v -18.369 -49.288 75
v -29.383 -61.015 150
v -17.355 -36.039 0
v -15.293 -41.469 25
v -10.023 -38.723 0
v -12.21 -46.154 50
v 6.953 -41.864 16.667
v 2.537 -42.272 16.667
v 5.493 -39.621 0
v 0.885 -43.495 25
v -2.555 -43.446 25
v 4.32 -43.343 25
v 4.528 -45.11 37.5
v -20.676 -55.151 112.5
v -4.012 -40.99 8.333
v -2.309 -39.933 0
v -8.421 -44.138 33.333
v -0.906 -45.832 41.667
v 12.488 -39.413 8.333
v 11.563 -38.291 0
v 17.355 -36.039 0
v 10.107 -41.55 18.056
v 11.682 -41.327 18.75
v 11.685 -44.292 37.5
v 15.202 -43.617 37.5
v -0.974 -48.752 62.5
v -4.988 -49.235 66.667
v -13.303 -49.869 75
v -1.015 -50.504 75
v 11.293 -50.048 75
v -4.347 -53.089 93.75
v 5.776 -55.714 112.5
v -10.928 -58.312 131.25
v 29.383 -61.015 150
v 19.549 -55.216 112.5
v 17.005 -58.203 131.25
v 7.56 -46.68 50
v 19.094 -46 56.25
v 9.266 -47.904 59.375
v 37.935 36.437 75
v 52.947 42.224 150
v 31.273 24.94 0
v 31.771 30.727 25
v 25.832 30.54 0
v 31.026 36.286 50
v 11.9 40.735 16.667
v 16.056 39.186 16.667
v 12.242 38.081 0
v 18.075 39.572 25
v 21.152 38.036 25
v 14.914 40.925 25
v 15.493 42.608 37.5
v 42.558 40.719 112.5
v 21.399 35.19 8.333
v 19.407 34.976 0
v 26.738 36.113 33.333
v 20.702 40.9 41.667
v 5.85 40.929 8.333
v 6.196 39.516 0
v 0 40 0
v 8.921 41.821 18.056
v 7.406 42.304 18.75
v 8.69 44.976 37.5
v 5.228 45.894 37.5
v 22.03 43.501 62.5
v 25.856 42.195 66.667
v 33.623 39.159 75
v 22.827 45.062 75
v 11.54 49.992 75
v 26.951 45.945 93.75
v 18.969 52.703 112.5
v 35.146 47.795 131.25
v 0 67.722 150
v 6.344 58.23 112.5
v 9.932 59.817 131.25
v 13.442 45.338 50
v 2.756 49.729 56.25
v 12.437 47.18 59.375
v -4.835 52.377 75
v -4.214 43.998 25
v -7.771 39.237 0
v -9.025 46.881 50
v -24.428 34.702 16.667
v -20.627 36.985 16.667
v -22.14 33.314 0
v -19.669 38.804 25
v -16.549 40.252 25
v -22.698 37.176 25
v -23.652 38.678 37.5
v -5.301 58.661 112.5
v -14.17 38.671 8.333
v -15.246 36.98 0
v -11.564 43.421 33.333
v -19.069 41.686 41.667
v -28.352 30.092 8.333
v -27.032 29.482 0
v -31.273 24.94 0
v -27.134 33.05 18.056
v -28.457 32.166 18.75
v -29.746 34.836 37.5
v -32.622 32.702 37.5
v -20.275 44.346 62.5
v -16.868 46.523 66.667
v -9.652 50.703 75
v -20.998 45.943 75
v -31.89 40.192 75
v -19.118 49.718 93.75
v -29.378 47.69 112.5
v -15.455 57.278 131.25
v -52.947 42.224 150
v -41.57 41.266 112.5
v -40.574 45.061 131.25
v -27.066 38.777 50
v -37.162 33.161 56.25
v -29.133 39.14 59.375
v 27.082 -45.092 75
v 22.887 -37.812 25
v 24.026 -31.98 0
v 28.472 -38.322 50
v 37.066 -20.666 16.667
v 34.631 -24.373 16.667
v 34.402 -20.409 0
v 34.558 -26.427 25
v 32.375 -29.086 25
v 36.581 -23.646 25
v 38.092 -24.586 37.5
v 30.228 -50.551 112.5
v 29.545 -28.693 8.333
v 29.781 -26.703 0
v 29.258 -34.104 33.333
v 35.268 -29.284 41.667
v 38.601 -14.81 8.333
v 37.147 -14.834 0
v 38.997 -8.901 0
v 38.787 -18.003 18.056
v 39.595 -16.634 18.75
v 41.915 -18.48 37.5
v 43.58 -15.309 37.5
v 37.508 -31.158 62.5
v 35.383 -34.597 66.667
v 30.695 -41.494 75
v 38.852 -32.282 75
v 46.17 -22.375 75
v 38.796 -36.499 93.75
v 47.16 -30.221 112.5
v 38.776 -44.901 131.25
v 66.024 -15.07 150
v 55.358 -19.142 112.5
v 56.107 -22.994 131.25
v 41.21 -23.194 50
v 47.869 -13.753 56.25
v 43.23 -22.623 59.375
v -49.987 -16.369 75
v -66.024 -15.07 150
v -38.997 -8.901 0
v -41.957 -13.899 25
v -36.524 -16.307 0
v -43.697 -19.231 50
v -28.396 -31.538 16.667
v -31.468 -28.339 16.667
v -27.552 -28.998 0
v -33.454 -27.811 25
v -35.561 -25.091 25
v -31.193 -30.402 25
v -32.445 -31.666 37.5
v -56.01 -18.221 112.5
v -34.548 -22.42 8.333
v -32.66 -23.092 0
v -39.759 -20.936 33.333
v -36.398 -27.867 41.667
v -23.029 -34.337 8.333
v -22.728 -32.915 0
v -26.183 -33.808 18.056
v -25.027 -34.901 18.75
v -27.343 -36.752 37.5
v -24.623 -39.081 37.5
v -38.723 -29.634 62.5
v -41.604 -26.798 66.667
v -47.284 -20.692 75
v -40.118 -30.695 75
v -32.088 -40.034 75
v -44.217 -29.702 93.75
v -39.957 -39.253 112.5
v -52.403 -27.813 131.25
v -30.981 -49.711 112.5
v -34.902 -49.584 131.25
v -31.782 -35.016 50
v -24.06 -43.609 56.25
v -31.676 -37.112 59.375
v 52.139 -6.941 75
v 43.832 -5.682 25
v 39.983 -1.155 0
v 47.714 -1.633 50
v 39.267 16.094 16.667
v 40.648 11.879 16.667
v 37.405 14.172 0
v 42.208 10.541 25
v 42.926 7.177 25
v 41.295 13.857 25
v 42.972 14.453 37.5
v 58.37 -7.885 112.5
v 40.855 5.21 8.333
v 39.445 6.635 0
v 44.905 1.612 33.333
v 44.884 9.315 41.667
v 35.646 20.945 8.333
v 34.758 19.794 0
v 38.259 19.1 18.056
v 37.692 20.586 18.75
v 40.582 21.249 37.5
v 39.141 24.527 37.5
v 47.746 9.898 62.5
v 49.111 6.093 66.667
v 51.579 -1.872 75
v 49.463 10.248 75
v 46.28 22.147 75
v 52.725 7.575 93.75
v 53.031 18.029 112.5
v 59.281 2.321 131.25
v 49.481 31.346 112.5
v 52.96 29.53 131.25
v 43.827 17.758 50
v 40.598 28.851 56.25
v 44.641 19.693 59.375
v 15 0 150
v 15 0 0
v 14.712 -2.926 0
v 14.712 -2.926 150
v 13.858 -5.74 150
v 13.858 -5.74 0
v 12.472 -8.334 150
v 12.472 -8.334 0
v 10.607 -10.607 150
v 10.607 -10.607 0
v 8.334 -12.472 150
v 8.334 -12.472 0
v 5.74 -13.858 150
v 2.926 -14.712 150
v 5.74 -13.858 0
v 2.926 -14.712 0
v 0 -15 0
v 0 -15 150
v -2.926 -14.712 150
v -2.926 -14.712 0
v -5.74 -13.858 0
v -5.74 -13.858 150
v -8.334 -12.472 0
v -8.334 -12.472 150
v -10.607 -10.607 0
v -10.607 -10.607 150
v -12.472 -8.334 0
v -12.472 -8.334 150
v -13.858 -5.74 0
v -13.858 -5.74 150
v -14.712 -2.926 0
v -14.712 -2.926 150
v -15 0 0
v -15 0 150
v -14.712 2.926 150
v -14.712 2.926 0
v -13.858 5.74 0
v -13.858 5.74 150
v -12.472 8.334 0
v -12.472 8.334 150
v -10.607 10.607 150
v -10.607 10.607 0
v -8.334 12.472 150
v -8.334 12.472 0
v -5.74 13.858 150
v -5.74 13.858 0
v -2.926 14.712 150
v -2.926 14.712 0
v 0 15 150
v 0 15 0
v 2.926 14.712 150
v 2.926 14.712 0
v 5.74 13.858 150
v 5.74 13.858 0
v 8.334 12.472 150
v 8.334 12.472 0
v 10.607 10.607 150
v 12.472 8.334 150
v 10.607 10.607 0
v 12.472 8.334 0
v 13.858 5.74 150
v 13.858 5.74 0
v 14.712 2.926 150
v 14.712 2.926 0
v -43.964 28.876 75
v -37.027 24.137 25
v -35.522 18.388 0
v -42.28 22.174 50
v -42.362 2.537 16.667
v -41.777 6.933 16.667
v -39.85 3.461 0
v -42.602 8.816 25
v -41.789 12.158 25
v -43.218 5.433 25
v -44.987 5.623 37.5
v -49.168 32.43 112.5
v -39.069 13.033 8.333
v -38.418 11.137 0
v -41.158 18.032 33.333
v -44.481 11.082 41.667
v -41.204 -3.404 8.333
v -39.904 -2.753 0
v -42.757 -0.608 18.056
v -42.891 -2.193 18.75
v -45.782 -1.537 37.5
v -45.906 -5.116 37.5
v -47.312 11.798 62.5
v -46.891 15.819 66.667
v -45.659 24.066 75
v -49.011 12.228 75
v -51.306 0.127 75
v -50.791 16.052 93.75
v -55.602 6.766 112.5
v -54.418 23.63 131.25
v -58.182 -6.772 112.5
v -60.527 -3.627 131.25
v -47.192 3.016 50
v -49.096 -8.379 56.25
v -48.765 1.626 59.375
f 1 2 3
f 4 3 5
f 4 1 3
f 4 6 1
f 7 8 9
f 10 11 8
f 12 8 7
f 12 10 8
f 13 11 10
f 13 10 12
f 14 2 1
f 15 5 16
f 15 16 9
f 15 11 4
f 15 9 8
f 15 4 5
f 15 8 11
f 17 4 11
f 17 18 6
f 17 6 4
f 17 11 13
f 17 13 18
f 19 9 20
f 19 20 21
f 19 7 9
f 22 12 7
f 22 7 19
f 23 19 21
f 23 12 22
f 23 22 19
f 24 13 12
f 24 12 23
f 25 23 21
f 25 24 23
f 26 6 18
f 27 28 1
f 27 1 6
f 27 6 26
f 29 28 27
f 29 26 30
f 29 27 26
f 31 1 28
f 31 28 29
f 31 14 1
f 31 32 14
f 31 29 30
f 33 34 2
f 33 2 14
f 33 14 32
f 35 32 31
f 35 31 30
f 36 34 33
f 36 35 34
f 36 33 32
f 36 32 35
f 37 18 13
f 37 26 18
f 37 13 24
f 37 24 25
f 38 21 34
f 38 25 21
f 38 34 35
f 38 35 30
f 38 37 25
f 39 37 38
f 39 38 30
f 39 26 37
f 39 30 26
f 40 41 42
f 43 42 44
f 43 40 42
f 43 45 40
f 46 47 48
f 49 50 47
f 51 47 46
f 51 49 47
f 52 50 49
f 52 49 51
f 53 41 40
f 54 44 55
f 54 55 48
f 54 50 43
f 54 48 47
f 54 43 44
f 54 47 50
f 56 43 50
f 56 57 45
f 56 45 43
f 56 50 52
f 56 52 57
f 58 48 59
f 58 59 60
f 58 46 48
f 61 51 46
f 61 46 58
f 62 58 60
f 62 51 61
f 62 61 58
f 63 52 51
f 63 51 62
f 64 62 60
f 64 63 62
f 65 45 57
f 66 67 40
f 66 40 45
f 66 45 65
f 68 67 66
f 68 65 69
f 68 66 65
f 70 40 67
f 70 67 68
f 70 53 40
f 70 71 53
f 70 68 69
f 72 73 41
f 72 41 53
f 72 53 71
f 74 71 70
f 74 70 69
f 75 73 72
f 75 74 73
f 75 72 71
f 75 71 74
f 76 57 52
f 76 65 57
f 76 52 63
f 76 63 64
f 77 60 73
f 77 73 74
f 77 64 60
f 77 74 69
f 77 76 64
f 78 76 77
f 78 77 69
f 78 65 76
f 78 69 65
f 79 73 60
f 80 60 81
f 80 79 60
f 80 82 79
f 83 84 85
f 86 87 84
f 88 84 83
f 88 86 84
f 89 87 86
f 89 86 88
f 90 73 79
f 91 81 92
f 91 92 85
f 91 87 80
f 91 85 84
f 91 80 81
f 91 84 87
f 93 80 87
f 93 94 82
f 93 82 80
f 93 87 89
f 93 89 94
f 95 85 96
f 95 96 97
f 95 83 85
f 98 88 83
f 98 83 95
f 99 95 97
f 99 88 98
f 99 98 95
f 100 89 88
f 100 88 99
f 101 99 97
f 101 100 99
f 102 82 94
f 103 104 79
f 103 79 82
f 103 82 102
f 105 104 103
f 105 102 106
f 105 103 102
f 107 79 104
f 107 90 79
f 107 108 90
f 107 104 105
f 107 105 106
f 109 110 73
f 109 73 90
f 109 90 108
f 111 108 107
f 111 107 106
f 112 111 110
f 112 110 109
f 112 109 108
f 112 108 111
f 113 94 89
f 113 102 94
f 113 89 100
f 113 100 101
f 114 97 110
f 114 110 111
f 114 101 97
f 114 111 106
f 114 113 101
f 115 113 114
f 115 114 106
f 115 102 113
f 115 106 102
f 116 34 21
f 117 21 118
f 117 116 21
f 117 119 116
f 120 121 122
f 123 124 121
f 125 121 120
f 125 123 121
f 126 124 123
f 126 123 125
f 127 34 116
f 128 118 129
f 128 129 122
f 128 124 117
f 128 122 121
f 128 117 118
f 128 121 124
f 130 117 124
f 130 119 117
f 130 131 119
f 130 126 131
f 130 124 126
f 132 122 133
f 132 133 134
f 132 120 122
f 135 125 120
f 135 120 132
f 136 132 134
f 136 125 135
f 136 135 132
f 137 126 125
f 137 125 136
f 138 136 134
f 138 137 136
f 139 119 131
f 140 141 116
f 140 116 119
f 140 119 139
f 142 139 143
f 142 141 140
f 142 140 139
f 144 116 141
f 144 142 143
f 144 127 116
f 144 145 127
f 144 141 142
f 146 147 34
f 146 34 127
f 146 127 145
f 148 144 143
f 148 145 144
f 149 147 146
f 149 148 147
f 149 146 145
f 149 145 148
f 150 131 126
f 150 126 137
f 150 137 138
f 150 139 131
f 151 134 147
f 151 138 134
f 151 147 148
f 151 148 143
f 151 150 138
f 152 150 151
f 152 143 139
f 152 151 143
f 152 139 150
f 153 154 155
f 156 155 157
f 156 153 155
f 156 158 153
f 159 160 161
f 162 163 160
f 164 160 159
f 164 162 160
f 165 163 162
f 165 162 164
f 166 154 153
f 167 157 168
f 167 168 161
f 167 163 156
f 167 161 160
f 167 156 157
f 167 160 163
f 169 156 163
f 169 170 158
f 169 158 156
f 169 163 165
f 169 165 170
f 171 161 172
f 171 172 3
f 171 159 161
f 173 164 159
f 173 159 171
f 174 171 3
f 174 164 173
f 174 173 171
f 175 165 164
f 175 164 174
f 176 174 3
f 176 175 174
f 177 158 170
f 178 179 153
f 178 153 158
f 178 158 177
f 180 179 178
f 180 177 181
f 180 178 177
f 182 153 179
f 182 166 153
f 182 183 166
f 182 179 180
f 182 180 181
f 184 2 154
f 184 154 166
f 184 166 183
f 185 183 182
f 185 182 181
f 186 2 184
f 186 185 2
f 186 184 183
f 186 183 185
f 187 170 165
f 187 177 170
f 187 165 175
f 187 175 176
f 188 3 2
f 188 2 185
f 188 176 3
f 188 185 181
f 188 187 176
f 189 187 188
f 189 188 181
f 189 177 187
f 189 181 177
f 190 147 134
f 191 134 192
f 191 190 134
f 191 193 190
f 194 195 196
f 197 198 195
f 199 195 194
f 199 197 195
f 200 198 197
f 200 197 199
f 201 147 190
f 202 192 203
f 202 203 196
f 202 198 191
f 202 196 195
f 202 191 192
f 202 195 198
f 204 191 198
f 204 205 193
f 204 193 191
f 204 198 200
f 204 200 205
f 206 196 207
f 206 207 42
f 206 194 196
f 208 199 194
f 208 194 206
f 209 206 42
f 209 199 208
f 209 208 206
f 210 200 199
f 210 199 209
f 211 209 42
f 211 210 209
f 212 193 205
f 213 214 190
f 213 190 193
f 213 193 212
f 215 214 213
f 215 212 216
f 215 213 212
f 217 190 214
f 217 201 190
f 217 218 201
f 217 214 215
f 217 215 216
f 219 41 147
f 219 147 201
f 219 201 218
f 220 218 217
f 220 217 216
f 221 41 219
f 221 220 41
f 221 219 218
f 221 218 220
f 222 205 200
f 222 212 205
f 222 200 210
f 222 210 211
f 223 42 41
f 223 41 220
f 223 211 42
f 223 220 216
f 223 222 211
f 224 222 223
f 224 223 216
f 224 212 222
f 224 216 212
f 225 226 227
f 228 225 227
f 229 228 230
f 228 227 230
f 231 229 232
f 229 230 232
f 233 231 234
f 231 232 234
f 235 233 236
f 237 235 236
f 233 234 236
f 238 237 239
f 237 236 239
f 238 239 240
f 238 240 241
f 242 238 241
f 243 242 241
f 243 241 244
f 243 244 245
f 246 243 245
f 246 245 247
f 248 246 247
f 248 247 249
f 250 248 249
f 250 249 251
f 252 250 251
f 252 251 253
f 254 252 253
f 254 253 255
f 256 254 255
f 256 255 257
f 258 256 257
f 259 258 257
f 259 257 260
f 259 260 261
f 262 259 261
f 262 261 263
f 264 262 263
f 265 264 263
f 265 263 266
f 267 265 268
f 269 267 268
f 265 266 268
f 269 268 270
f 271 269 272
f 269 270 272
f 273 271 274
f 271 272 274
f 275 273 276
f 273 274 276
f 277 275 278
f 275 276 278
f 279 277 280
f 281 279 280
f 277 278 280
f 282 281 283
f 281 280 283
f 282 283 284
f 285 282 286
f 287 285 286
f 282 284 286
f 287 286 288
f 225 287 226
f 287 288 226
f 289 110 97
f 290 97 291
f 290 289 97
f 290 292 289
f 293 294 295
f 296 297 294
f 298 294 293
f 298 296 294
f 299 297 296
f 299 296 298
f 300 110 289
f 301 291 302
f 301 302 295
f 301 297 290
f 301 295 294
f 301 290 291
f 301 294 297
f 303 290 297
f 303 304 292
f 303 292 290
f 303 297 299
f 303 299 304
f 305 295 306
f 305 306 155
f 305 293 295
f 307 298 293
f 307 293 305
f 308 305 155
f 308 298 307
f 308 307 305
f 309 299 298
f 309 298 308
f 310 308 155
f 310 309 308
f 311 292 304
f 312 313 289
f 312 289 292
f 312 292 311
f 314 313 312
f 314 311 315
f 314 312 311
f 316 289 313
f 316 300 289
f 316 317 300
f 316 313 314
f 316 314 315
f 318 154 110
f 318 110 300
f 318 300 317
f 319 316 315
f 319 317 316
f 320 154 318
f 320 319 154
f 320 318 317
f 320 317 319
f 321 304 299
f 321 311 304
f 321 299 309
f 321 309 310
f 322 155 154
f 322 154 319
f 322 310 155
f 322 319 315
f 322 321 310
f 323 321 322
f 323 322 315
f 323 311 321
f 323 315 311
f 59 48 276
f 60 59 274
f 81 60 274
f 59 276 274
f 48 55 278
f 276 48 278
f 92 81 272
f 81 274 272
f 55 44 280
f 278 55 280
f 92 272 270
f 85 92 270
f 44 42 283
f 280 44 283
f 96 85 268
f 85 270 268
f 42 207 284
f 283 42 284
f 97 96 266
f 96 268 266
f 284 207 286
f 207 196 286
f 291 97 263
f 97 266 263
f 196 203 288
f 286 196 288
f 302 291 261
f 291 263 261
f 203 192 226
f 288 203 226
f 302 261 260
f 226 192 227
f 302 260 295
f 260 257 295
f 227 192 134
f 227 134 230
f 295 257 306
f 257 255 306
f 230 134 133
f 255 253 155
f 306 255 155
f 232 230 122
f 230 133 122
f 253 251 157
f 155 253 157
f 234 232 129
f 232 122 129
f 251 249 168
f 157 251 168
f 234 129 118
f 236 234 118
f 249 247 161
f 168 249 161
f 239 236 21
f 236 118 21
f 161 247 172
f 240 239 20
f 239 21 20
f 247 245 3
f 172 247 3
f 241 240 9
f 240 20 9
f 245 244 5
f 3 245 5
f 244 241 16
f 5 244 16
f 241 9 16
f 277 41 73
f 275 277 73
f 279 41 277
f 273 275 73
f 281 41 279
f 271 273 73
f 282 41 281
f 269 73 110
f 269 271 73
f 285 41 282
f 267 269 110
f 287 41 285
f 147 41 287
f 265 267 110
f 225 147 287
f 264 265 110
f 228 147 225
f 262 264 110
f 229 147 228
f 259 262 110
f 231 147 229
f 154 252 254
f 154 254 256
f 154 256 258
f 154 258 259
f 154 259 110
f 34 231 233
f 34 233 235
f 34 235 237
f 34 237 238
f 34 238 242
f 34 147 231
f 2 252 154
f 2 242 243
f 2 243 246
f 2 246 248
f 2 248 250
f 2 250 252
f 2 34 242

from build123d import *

# Parameters (mm, degrees)
F4_R     = 15
F5_DEPTH = 172


# Not quite as in the source:
# - the arcs of a loft's sections are written as splines that run evenly, so that the points pair up as in the source's solid


with BuildPart() as f3:
    # F1 (on Top) → F3 section 0
    with BuildSketch(Plane.XY):
        with BuildLine():
            add(Edge.make_bspline(
                [(31.2732592987, 24.9395920743), (28.7859564656, 28.0585711749), (25.8289364984, 30.8022847428), (19.2366681467, 35.2968172025), (15.6022965087, 37.0470383387), (7.9781174442, 39.3987861242), (3.9893240046, 40), (0, 40)],
                knots=[0, 0, 0, 0, 0.3333333333, 0.3333333333, 0.6666666667, 0.6666666667, 1, 1, 1, 1], degree=3))
            add(Edge.make_bspline(
                [(0, 40), (-3.9893240046, 40), (-7.9781174442, 39.3987861242), (-15.6022965087, 37.0470383387), (-19.2366681467, 35.2968172025), (-25.8289364984, 30.8022847428), (-28.7859564656, 28.0585711749), (-31.2732592987, 24.9395920743)],
                knots=[0, 0, 0, 0, 0.3333333333, 0.3333333333, 0.6666666667, 0.6666666667, 1, 1, 1, 1], degree=3))
            add(Edge.make_bspline(
                [(-31.2732592987, 24.9395920743), (-33.7605621319, 21.8206129738), (-35.7774862274, 18.3271979653), (-38.6924136641, 10.900083984), (-39.590029331, 6.967372789), (-40.1862744435, -0.9889653021), (-39.8848245906, -5.0115340355), (-38.9971164873, -8.9008373583)],
                knots=[0, 0, 0, 0, 0.3333333333, 0.3333333333, 0.6666666667, 0.6666666667, 1, 1, 1, 1], degree=3))
            add(Edge.make_bspline(
                [(-38.9971164873, -8.9008373583), (-38.1094083839, -12.790140681), (-36.6356781537, -16.5451440681), (-32.6463541491, -23.4548559319), (-30.1312909397, -26.6086454432), (-24.282528082, -32.0355043032), (-20.9496062968, -34.3078519004), (-17.3553495647, -36.0387547161)],
                knots=[0, 0, 0, 0, 0.3333333333, 0.3333333333, 0.6666666667, 0.6666666667, 1, 1, 1, 1], degree=3))
            add(Edge.make_bspline(
                [(-17.3553495647, -36.0387547161), (-13.7610928326, -37.7696575317), (-9.9064571986, -38.9586551589), (-2.0169240955, -40.1478109392), (2.0169240955, -40.1478109392), (9.9064571986, -38.9586551589), (13.7610928326, -37.7696575317), (17.3553495647, -36.0387547161)],
                knots=[0, 0, 0, 0, 0.3333333333, 0.3333333333, 0.6666666667, 0.6666666667, 1, 1, 1, 1], degree=3))
            add(Edge.make_bspline(
                [(17.3553495647, -36.0387547161), (20.9496062968, -34.3078519004), (24.282528082, -32.0355043032), (30.1312909397, -26.6086454432), (32.6463541491, -23.4548559319), (36.6356781537, -16.5451440681), (38.1094083839, -12.790140681), (38.9971164873, -8.9008373583)],
                knots=[0, 0, 0, 0, 0.3333333333, 0.3333333333, 0.6666666667, 0.6666666667, 1, 1, 1, 1], degree=3))
            add(Edge.make_bspline(
                [(38.9971164873, -8.9008373583), (39.8848245906, -5.0115340355), (40.1862744435, -0.9889653021), (39.590029331, 6.967372789), (38.6924136641, 10.900083984), (35.7774862274, 18.3271979653), (33.7605621319, 21.8206129738), (31.2732592987, 24.9395920743)],
                knots=[0, 0, 0, 0, 0.3333333333, 0.3333333333, 0.6666666667, 0.6666666667, 1, 1, 1, 1], degree=3))
        make_face()
    # F2 (on offset) → F3 section 1
    with BuildSketch(Plane.XY.offset(150)):
        Polygon((52.9471102464, 42.2239114397), (0, 67.7218958735), (-52.9471102464, 42.2239114397), (-66.023966553, -15.0695395191), (-29.3834294017, -61.0153198574), (29.3834294017, -61.0153198574), (66.023966553, -15.0695395191), align=None)
    loft(ruled=True)

    # F4 (on face) → F5 (cut)
    with BuildSketch(Plane(origin=(0, 0, 0), x_dir=(1, 0, 0), z_dir=(0, 0, -1))):
        Circle(F4_R)
    extrude(amount=-F5_DEPTH, mode=Mode.SUBTRACT)


solid = f3.part
